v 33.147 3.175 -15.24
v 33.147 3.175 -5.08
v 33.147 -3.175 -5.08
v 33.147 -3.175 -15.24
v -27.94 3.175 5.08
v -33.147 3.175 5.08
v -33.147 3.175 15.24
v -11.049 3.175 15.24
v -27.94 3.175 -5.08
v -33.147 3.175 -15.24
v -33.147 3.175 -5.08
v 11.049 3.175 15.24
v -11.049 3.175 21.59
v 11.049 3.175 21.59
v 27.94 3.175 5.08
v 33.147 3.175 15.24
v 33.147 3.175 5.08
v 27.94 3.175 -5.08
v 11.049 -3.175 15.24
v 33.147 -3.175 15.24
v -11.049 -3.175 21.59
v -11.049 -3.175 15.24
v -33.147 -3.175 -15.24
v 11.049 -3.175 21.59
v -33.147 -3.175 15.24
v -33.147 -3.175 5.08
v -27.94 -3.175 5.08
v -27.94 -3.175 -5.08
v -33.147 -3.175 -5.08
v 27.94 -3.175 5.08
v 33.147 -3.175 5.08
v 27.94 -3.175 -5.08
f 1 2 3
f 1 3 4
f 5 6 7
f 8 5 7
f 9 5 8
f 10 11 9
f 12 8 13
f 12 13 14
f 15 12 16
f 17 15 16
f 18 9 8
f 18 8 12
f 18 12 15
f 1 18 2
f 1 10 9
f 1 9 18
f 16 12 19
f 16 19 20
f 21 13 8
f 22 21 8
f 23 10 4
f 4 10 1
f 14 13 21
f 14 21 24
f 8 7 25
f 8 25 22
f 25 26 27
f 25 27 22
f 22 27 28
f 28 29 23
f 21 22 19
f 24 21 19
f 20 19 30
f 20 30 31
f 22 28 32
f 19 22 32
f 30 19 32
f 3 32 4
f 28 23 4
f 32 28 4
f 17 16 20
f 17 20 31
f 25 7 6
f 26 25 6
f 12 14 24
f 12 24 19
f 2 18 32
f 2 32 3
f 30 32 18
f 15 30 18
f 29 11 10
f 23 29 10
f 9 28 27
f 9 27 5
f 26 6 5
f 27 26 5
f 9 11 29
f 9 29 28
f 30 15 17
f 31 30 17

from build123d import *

# Parameters (mm, degrees)
SKETCH1_W           = 66.294
SKETCH1_H           = 30.48
BOSS_EXTRUDE1_DEPTH = 3.175
SKETCH2_W           = 22.098
SKETCH2_H           = 6.35
BOSS_EXTRUDE2_DEPTH = 6.35
CAVITY1_START       = -5.08
CAVITY1_OUTLINE_W   = 5.207
CAVITY1_OUTLINE_H   = 6.35
CAVITY1_DEPTH       = 10.16


# Read off the part's stored shape, not the designer's step: Cavity1
with BuildPart() as part:
    # Sketch1 → Boss-Extrude1 (new, symmetric)
    with BuildSketch(Plane(origin=(0, 0, 0), x_dir=(1, 0, 0), z_dir=(0, 1, 0))):
        Rectangle(SKETCH1_W, SKETCH1_H)
    extrude(amount=BOSS_EXTRUDE1_DEPTH, both=True)

    # Sketch2 → Boss-Extrude2 (add)
    with BuildSketch(Plane(origin=(0, 3.175, 0), x_dir=(1, 0, 0), z_dir=(0, 1, 0))):
        with Locations((0, -18.415)):
            Rectangle(SKETCH2_W, SKETCH2_H)
    extrude(amount=-BOSS_EXTRUDE2_DEPTH)

    # Cavity1 outline → Cavity1 (cut)
    with BuildSketch(Plane.XY.offset(CAVITY1_START)):
        with Locations((30.5435, 0)):
            Rectangle(CAVITY1_OUTLINE_W, CAVITY1_OUTLINE_H)
        with Locations((-30.5435, 0)):
            Rectangle(CAVITY1_OUTLINE_W, CAVITY1_OUTLINE_H)
    extrude(amount=CAVITY1_DEPTH, mode=Mode.SUBTRACT)


solid = part.part
